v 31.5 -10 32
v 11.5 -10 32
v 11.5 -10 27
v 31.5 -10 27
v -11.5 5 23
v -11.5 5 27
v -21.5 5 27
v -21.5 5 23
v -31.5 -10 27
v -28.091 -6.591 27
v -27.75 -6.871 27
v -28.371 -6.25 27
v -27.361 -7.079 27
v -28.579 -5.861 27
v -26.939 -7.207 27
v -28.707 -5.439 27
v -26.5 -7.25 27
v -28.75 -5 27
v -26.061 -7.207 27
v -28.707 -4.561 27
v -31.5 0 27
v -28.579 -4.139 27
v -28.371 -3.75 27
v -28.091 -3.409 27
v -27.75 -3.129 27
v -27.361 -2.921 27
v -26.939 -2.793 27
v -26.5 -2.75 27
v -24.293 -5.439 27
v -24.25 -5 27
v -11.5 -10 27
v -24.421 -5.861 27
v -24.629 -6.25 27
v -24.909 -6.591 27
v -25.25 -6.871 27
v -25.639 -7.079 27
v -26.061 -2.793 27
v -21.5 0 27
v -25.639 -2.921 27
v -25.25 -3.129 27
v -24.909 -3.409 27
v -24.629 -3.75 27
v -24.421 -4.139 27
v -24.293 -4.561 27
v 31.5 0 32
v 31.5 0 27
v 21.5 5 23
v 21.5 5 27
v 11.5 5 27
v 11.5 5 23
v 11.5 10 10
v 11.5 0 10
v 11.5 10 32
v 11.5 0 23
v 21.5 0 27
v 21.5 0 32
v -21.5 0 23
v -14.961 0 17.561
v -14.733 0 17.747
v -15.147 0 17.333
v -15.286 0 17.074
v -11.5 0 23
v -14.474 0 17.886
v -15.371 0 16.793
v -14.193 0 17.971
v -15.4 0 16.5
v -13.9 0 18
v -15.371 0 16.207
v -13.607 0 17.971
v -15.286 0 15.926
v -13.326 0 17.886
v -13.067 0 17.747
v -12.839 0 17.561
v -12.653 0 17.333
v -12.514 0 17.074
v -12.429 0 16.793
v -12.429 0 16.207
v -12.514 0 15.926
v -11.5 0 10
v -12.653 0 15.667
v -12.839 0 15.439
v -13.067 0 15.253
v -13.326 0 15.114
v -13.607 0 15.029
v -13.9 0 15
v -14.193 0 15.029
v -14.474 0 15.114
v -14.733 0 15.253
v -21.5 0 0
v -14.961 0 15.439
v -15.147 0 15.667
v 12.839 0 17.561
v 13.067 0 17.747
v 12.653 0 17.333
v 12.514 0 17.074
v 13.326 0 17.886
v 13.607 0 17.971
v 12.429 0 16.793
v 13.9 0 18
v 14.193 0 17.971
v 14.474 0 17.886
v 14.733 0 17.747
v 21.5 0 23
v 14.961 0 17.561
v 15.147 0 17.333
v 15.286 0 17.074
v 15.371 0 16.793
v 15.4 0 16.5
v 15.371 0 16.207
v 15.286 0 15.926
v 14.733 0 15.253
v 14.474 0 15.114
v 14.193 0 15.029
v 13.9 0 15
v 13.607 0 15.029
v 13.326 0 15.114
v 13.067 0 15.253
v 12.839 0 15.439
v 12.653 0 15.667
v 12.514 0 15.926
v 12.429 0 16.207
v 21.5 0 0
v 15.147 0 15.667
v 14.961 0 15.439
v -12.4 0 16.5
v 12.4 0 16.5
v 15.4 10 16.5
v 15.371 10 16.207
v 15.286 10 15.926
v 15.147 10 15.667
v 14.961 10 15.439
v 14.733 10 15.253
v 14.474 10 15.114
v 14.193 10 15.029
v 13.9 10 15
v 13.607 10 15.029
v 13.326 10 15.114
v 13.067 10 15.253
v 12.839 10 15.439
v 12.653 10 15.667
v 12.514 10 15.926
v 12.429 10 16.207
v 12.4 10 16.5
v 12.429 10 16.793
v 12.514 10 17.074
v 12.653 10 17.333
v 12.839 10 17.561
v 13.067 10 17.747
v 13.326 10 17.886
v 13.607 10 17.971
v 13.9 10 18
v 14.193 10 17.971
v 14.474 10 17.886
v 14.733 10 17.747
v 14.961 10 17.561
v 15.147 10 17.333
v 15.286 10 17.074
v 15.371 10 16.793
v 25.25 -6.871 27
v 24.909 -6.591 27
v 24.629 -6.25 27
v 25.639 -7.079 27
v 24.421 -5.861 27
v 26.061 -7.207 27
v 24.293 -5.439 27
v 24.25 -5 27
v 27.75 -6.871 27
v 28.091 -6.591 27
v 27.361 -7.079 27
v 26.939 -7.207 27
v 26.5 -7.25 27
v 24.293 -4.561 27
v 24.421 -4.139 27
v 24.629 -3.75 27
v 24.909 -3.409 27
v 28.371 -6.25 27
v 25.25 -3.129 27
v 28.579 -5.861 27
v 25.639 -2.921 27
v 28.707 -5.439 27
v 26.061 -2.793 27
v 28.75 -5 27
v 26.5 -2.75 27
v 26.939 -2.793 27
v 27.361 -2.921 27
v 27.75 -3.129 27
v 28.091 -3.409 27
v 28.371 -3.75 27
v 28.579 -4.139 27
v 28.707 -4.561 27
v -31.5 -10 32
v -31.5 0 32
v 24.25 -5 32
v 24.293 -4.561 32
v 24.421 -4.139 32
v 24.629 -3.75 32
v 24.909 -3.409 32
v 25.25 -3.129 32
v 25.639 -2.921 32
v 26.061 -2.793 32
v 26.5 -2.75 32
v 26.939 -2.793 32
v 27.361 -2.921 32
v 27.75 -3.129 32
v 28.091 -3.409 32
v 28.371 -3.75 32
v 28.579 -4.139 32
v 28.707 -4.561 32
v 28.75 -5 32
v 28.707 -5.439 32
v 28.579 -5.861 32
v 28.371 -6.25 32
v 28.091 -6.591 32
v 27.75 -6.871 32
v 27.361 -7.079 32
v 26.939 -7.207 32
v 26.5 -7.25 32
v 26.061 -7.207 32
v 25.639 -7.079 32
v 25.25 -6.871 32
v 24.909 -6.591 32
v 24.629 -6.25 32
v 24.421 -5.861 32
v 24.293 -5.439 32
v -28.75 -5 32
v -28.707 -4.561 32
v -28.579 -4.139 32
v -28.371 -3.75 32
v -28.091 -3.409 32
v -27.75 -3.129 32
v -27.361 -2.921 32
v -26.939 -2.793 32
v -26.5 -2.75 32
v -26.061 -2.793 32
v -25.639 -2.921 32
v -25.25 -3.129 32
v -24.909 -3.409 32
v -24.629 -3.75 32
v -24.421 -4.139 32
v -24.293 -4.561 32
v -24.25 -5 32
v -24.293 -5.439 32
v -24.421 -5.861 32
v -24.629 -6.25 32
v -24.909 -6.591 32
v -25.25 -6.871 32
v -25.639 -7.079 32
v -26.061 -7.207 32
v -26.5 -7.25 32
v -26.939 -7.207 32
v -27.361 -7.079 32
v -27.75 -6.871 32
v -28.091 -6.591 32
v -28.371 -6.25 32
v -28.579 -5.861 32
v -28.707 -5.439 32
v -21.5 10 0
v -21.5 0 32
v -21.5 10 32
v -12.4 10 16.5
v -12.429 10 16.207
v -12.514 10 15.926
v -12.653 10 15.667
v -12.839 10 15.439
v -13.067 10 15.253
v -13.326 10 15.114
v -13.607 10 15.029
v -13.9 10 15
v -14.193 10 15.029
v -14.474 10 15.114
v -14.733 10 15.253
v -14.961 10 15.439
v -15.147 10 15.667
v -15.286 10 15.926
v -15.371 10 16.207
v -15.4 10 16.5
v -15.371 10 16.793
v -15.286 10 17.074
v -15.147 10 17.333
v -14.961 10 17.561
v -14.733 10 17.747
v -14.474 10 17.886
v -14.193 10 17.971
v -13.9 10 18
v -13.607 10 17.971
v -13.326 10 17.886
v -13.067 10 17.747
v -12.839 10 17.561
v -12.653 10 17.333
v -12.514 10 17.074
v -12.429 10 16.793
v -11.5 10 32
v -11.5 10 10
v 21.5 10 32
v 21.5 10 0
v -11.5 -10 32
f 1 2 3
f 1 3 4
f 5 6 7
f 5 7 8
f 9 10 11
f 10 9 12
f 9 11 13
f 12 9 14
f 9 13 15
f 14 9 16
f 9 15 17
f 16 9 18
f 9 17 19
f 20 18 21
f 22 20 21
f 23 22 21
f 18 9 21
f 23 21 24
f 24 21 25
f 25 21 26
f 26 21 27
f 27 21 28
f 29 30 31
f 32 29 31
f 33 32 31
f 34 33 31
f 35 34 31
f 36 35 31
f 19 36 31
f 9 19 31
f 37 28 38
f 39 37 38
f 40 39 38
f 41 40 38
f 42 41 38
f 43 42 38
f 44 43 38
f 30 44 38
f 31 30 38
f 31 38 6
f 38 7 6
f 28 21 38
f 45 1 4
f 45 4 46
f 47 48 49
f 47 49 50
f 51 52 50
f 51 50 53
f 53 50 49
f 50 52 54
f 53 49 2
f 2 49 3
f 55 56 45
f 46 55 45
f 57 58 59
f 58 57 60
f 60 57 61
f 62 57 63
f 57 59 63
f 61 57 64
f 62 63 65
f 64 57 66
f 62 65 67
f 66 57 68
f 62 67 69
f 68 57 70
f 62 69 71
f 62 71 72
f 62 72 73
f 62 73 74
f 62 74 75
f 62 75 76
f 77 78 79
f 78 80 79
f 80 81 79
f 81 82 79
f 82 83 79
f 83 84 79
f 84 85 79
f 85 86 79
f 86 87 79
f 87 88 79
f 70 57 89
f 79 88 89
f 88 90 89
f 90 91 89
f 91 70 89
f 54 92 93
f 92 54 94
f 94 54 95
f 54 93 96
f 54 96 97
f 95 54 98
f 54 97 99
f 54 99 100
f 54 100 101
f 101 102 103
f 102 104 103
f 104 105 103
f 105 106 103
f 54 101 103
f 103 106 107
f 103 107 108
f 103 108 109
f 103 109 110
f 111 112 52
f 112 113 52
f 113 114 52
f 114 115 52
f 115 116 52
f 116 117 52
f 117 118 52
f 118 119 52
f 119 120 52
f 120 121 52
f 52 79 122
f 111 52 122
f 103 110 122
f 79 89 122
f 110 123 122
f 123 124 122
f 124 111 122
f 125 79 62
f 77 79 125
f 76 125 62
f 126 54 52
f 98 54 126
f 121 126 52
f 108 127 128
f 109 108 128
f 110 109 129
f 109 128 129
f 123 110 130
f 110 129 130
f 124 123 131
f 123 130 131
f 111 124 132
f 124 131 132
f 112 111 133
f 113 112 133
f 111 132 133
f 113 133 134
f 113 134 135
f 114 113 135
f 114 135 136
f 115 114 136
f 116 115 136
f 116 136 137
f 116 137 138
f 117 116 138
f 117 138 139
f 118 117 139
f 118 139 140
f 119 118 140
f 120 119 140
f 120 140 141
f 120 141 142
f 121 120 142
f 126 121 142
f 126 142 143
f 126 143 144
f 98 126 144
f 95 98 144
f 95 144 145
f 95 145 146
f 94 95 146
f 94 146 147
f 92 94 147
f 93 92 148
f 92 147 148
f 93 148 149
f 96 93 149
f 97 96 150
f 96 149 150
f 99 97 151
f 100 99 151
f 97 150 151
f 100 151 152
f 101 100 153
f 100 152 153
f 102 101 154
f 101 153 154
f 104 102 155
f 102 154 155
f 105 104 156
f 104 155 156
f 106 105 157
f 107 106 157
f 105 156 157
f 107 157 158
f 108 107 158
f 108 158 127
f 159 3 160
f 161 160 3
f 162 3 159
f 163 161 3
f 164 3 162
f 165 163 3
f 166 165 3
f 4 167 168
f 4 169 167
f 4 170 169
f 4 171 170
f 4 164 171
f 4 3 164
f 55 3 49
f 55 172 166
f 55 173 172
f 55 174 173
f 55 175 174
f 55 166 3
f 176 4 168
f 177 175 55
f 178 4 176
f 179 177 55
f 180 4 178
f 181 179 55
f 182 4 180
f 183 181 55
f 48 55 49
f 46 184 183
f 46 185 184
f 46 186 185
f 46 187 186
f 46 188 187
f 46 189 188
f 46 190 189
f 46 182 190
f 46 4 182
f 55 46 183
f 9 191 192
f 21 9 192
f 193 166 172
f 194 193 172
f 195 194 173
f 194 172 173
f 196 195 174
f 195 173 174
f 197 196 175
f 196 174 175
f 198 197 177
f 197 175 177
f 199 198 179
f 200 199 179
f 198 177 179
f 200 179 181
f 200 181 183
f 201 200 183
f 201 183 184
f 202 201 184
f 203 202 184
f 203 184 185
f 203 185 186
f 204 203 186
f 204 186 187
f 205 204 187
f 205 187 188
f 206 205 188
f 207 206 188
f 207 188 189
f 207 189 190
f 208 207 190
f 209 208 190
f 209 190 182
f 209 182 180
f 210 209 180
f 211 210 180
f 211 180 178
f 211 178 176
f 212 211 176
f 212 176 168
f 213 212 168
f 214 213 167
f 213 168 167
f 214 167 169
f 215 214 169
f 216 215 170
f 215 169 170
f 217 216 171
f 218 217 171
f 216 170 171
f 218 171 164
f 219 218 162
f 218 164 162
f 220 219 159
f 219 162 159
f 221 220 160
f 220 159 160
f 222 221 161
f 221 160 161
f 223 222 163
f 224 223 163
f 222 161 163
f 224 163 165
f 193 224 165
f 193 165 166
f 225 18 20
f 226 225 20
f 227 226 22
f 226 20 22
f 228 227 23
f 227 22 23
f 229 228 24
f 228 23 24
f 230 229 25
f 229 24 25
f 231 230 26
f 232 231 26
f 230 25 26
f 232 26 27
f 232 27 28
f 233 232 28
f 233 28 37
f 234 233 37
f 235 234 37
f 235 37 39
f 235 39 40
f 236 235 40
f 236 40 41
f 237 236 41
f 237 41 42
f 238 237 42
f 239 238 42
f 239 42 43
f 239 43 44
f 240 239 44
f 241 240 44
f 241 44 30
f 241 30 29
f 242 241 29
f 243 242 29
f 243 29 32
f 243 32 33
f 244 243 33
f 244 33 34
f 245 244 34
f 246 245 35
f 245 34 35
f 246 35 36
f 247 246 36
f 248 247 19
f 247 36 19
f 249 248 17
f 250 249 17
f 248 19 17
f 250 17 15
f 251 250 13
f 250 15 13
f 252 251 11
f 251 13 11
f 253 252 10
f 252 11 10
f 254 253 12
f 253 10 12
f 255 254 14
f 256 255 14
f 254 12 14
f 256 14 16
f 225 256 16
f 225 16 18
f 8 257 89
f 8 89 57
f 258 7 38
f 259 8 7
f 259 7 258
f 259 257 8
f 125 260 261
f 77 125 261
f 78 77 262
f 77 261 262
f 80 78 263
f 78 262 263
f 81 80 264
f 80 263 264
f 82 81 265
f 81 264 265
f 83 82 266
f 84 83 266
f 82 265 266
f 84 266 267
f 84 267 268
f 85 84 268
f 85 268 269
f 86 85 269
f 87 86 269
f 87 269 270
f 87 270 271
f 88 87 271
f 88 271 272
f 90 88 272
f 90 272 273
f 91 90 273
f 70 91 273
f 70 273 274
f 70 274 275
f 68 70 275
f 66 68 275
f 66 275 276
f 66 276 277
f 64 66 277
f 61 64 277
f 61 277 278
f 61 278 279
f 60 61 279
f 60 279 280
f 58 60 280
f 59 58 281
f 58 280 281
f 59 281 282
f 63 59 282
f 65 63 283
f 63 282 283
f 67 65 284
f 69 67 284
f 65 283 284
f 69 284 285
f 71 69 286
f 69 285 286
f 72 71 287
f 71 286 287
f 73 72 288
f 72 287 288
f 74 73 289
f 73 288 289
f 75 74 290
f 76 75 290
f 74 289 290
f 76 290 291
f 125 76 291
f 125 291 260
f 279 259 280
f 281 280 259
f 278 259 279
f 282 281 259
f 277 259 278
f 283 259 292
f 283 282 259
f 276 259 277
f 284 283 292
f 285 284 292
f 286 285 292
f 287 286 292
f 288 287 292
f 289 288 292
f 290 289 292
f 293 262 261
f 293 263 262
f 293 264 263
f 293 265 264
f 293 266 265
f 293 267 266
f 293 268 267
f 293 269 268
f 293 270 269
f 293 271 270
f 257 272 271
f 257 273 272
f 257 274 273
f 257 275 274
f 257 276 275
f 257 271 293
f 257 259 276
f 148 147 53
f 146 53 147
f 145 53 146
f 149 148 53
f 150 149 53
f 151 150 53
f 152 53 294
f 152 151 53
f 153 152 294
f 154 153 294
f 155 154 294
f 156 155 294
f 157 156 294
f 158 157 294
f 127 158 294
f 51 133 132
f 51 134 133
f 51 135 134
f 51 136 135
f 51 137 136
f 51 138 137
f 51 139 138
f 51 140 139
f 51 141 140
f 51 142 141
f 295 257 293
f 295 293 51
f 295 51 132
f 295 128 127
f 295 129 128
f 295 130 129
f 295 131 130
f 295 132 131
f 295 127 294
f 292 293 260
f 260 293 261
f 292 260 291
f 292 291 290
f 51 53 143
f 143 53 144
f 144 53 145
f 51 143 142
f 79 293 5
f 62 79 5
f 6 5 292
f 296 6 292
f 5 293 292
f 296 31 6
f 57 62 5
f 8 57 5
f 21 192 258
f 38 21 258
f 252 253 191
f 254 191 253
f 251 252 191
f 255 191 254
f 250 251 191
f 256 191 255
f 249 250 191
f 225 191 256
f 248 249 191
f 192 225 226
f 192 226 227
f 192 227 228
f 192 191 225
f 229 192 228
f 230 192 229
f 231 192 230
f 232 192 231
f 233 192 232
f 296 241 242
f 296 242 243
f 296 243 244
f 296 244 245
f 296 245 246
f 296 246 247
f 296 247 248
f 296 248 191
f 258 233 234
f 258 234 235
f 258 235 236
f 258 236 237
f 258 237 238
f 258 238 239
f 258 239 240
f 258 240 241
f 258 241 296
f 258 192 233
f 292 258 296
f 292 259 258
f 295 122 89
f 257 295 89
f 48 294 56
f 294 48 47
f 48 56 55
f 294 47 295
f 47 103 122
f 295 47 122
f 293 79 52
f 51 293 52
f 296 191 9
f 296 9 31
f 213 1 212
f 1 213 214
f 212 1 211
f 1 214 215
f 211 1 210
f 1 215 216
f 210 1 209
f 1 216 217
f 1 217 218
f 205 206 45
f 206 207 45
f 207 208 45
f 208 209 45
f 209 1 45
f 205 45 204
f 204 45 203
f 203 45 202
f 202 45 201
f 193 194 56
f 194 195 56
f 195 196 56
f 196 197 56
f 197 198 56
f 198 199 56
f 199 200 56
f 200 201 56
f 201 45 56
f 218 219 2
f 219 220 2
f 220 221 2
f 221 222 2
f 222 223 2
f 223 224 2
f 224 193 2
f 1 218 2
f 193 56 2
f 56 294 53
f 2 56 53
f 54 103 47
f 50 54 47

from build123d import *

# Parameters (mm, degrees)
RESSALTO_EXTRUS_O1_DEPTH = 10
ESBO_O2_R                = 1.5
CORTE_EXTRUS_O1_DEPTH    = 11
RESSALTO_EXTRUS_O2_DEPTH = 10
ESBO_O4_W                = 4
ESBO_O4_H                = 5
CORTE_EXTRUS_O4_DEPTH    = 44
ESBO_O5_W                = 10
ESBO_O5_H                = 5
RESSALTO_EXTRUS_O3_DEPTH = 10
ESBO_O6_W                = 10
ESBO_O6_H                = 10
RESSALTO_EXTRUS_O4_DEPTH = 5
FURO_COM_FOLGA_DE_M41_D  = 4.5


with BuildPart() as part:
    # Esboço1 → Ressalto-extrusão1 (new body)
    with BuildSketch(Plane(origin=(0, 0, 0), x_dir=(1, 0, 0), z_dir=(0, 1, 0))):
        Polygon((-21.5, 0), (-21.5, -23), (-11.5, -23), (-11.5, -10), (11.5, -10), (11.5, -23), (21.5, -23), (21.5, 0), align=None)
    extrude(amount=RESSALTO_EXTRUS_O1_DEPTH)

    # Esboço2 → Corte-extrusão1 (cut, through all)
    with BuildSketch(Plane(origin=(0, 10, 0), x_dir=(1, 0, 0), z_dir=(0, 1, 0))):
        with Locations((-13.9, -16.5)):
            Circle(ESBO_O2_R)
        with Locations((13.9, -16.5)):
            Circle(ESBO_O2_R)
    extrude(amount=-CORTE_EXTRUS_O1_DEPTH, mode=Mode.SUBTRACT)

    # Esboço3 → Ressalto-extrusão2 (add)
    with BuildSketch(Plane(origin=(0, 10, 0), x_dir=(1, 0, 0), z_dir=(0, 1, 0))):
        Polygon((-21.5, -23), (-21.5, -27), (-21.5, -32), (-11.5, -32), (-11.5, -27), (-11.5, -23), align=None)
        Polygon((11.5, -23), (21.5, -23), (21.5, -27), (21.5, -32), (11.5, -32), (11.5, -27), align=None)
    extrude(amount=-RESSALTO_EXTRUS_O2_DEPTH)

    # Esboço4 → Corte-extrusão4 (cut, through all)
    with BuildSketch(Plane(origin=(21.5, 0, 0), x_dir=(0, 0, -1), z_dir=(1, 0, 0))):
        with Locations((-25, 2.5)):
            Rectangle(ESBO_O4_W, ESBO_O4_H)
    extrude(amount=-CORTE_EXTRUS_O4_DEPTH, mode=Mode.SUBTRACT)

    # Esboço5 → Ressalto-extrusão3 (add)
    with BuildSketch(Plane.XZ):
        with Locations((-16.5, 29.5)):
            Rectangle(ESBO_O5_W, ESBO_O5_H)
        with Locations((16.5, 29.5)):
            Rectangle(ESBO_O5_W, ESBO_O5_H)
    extrude(amount=RESSALTO_EXTRUS_O3_DEPTH)

    # Esboço6 → Ressalto-extrusão4 (add)
    with BuildSketch(Plane.XY.offset(32)):
        with Locations((-26.5, -5)):
            Rectangle(ESBO_O6_W, ESBO_O6_H)
        with Locations((26.5, -5)):
            Rectangle(ESBO_O6_W, ESBO_O6_H)
    extrude(amount=-RESSALTO_EXTRUS_O4_DEPTH)

    # Furo com folga de M41 (through all)
    with Locations(Plane(origin=(-26.5, -5, 32), x_dir=(1, 0, 0), z_dir=(0, 0, 1))):
        with Locations((0, 0), (53, 0)):
            Hole(FURO_COM_FOLGA_DE_M41_D / 2)


solid = part.part
